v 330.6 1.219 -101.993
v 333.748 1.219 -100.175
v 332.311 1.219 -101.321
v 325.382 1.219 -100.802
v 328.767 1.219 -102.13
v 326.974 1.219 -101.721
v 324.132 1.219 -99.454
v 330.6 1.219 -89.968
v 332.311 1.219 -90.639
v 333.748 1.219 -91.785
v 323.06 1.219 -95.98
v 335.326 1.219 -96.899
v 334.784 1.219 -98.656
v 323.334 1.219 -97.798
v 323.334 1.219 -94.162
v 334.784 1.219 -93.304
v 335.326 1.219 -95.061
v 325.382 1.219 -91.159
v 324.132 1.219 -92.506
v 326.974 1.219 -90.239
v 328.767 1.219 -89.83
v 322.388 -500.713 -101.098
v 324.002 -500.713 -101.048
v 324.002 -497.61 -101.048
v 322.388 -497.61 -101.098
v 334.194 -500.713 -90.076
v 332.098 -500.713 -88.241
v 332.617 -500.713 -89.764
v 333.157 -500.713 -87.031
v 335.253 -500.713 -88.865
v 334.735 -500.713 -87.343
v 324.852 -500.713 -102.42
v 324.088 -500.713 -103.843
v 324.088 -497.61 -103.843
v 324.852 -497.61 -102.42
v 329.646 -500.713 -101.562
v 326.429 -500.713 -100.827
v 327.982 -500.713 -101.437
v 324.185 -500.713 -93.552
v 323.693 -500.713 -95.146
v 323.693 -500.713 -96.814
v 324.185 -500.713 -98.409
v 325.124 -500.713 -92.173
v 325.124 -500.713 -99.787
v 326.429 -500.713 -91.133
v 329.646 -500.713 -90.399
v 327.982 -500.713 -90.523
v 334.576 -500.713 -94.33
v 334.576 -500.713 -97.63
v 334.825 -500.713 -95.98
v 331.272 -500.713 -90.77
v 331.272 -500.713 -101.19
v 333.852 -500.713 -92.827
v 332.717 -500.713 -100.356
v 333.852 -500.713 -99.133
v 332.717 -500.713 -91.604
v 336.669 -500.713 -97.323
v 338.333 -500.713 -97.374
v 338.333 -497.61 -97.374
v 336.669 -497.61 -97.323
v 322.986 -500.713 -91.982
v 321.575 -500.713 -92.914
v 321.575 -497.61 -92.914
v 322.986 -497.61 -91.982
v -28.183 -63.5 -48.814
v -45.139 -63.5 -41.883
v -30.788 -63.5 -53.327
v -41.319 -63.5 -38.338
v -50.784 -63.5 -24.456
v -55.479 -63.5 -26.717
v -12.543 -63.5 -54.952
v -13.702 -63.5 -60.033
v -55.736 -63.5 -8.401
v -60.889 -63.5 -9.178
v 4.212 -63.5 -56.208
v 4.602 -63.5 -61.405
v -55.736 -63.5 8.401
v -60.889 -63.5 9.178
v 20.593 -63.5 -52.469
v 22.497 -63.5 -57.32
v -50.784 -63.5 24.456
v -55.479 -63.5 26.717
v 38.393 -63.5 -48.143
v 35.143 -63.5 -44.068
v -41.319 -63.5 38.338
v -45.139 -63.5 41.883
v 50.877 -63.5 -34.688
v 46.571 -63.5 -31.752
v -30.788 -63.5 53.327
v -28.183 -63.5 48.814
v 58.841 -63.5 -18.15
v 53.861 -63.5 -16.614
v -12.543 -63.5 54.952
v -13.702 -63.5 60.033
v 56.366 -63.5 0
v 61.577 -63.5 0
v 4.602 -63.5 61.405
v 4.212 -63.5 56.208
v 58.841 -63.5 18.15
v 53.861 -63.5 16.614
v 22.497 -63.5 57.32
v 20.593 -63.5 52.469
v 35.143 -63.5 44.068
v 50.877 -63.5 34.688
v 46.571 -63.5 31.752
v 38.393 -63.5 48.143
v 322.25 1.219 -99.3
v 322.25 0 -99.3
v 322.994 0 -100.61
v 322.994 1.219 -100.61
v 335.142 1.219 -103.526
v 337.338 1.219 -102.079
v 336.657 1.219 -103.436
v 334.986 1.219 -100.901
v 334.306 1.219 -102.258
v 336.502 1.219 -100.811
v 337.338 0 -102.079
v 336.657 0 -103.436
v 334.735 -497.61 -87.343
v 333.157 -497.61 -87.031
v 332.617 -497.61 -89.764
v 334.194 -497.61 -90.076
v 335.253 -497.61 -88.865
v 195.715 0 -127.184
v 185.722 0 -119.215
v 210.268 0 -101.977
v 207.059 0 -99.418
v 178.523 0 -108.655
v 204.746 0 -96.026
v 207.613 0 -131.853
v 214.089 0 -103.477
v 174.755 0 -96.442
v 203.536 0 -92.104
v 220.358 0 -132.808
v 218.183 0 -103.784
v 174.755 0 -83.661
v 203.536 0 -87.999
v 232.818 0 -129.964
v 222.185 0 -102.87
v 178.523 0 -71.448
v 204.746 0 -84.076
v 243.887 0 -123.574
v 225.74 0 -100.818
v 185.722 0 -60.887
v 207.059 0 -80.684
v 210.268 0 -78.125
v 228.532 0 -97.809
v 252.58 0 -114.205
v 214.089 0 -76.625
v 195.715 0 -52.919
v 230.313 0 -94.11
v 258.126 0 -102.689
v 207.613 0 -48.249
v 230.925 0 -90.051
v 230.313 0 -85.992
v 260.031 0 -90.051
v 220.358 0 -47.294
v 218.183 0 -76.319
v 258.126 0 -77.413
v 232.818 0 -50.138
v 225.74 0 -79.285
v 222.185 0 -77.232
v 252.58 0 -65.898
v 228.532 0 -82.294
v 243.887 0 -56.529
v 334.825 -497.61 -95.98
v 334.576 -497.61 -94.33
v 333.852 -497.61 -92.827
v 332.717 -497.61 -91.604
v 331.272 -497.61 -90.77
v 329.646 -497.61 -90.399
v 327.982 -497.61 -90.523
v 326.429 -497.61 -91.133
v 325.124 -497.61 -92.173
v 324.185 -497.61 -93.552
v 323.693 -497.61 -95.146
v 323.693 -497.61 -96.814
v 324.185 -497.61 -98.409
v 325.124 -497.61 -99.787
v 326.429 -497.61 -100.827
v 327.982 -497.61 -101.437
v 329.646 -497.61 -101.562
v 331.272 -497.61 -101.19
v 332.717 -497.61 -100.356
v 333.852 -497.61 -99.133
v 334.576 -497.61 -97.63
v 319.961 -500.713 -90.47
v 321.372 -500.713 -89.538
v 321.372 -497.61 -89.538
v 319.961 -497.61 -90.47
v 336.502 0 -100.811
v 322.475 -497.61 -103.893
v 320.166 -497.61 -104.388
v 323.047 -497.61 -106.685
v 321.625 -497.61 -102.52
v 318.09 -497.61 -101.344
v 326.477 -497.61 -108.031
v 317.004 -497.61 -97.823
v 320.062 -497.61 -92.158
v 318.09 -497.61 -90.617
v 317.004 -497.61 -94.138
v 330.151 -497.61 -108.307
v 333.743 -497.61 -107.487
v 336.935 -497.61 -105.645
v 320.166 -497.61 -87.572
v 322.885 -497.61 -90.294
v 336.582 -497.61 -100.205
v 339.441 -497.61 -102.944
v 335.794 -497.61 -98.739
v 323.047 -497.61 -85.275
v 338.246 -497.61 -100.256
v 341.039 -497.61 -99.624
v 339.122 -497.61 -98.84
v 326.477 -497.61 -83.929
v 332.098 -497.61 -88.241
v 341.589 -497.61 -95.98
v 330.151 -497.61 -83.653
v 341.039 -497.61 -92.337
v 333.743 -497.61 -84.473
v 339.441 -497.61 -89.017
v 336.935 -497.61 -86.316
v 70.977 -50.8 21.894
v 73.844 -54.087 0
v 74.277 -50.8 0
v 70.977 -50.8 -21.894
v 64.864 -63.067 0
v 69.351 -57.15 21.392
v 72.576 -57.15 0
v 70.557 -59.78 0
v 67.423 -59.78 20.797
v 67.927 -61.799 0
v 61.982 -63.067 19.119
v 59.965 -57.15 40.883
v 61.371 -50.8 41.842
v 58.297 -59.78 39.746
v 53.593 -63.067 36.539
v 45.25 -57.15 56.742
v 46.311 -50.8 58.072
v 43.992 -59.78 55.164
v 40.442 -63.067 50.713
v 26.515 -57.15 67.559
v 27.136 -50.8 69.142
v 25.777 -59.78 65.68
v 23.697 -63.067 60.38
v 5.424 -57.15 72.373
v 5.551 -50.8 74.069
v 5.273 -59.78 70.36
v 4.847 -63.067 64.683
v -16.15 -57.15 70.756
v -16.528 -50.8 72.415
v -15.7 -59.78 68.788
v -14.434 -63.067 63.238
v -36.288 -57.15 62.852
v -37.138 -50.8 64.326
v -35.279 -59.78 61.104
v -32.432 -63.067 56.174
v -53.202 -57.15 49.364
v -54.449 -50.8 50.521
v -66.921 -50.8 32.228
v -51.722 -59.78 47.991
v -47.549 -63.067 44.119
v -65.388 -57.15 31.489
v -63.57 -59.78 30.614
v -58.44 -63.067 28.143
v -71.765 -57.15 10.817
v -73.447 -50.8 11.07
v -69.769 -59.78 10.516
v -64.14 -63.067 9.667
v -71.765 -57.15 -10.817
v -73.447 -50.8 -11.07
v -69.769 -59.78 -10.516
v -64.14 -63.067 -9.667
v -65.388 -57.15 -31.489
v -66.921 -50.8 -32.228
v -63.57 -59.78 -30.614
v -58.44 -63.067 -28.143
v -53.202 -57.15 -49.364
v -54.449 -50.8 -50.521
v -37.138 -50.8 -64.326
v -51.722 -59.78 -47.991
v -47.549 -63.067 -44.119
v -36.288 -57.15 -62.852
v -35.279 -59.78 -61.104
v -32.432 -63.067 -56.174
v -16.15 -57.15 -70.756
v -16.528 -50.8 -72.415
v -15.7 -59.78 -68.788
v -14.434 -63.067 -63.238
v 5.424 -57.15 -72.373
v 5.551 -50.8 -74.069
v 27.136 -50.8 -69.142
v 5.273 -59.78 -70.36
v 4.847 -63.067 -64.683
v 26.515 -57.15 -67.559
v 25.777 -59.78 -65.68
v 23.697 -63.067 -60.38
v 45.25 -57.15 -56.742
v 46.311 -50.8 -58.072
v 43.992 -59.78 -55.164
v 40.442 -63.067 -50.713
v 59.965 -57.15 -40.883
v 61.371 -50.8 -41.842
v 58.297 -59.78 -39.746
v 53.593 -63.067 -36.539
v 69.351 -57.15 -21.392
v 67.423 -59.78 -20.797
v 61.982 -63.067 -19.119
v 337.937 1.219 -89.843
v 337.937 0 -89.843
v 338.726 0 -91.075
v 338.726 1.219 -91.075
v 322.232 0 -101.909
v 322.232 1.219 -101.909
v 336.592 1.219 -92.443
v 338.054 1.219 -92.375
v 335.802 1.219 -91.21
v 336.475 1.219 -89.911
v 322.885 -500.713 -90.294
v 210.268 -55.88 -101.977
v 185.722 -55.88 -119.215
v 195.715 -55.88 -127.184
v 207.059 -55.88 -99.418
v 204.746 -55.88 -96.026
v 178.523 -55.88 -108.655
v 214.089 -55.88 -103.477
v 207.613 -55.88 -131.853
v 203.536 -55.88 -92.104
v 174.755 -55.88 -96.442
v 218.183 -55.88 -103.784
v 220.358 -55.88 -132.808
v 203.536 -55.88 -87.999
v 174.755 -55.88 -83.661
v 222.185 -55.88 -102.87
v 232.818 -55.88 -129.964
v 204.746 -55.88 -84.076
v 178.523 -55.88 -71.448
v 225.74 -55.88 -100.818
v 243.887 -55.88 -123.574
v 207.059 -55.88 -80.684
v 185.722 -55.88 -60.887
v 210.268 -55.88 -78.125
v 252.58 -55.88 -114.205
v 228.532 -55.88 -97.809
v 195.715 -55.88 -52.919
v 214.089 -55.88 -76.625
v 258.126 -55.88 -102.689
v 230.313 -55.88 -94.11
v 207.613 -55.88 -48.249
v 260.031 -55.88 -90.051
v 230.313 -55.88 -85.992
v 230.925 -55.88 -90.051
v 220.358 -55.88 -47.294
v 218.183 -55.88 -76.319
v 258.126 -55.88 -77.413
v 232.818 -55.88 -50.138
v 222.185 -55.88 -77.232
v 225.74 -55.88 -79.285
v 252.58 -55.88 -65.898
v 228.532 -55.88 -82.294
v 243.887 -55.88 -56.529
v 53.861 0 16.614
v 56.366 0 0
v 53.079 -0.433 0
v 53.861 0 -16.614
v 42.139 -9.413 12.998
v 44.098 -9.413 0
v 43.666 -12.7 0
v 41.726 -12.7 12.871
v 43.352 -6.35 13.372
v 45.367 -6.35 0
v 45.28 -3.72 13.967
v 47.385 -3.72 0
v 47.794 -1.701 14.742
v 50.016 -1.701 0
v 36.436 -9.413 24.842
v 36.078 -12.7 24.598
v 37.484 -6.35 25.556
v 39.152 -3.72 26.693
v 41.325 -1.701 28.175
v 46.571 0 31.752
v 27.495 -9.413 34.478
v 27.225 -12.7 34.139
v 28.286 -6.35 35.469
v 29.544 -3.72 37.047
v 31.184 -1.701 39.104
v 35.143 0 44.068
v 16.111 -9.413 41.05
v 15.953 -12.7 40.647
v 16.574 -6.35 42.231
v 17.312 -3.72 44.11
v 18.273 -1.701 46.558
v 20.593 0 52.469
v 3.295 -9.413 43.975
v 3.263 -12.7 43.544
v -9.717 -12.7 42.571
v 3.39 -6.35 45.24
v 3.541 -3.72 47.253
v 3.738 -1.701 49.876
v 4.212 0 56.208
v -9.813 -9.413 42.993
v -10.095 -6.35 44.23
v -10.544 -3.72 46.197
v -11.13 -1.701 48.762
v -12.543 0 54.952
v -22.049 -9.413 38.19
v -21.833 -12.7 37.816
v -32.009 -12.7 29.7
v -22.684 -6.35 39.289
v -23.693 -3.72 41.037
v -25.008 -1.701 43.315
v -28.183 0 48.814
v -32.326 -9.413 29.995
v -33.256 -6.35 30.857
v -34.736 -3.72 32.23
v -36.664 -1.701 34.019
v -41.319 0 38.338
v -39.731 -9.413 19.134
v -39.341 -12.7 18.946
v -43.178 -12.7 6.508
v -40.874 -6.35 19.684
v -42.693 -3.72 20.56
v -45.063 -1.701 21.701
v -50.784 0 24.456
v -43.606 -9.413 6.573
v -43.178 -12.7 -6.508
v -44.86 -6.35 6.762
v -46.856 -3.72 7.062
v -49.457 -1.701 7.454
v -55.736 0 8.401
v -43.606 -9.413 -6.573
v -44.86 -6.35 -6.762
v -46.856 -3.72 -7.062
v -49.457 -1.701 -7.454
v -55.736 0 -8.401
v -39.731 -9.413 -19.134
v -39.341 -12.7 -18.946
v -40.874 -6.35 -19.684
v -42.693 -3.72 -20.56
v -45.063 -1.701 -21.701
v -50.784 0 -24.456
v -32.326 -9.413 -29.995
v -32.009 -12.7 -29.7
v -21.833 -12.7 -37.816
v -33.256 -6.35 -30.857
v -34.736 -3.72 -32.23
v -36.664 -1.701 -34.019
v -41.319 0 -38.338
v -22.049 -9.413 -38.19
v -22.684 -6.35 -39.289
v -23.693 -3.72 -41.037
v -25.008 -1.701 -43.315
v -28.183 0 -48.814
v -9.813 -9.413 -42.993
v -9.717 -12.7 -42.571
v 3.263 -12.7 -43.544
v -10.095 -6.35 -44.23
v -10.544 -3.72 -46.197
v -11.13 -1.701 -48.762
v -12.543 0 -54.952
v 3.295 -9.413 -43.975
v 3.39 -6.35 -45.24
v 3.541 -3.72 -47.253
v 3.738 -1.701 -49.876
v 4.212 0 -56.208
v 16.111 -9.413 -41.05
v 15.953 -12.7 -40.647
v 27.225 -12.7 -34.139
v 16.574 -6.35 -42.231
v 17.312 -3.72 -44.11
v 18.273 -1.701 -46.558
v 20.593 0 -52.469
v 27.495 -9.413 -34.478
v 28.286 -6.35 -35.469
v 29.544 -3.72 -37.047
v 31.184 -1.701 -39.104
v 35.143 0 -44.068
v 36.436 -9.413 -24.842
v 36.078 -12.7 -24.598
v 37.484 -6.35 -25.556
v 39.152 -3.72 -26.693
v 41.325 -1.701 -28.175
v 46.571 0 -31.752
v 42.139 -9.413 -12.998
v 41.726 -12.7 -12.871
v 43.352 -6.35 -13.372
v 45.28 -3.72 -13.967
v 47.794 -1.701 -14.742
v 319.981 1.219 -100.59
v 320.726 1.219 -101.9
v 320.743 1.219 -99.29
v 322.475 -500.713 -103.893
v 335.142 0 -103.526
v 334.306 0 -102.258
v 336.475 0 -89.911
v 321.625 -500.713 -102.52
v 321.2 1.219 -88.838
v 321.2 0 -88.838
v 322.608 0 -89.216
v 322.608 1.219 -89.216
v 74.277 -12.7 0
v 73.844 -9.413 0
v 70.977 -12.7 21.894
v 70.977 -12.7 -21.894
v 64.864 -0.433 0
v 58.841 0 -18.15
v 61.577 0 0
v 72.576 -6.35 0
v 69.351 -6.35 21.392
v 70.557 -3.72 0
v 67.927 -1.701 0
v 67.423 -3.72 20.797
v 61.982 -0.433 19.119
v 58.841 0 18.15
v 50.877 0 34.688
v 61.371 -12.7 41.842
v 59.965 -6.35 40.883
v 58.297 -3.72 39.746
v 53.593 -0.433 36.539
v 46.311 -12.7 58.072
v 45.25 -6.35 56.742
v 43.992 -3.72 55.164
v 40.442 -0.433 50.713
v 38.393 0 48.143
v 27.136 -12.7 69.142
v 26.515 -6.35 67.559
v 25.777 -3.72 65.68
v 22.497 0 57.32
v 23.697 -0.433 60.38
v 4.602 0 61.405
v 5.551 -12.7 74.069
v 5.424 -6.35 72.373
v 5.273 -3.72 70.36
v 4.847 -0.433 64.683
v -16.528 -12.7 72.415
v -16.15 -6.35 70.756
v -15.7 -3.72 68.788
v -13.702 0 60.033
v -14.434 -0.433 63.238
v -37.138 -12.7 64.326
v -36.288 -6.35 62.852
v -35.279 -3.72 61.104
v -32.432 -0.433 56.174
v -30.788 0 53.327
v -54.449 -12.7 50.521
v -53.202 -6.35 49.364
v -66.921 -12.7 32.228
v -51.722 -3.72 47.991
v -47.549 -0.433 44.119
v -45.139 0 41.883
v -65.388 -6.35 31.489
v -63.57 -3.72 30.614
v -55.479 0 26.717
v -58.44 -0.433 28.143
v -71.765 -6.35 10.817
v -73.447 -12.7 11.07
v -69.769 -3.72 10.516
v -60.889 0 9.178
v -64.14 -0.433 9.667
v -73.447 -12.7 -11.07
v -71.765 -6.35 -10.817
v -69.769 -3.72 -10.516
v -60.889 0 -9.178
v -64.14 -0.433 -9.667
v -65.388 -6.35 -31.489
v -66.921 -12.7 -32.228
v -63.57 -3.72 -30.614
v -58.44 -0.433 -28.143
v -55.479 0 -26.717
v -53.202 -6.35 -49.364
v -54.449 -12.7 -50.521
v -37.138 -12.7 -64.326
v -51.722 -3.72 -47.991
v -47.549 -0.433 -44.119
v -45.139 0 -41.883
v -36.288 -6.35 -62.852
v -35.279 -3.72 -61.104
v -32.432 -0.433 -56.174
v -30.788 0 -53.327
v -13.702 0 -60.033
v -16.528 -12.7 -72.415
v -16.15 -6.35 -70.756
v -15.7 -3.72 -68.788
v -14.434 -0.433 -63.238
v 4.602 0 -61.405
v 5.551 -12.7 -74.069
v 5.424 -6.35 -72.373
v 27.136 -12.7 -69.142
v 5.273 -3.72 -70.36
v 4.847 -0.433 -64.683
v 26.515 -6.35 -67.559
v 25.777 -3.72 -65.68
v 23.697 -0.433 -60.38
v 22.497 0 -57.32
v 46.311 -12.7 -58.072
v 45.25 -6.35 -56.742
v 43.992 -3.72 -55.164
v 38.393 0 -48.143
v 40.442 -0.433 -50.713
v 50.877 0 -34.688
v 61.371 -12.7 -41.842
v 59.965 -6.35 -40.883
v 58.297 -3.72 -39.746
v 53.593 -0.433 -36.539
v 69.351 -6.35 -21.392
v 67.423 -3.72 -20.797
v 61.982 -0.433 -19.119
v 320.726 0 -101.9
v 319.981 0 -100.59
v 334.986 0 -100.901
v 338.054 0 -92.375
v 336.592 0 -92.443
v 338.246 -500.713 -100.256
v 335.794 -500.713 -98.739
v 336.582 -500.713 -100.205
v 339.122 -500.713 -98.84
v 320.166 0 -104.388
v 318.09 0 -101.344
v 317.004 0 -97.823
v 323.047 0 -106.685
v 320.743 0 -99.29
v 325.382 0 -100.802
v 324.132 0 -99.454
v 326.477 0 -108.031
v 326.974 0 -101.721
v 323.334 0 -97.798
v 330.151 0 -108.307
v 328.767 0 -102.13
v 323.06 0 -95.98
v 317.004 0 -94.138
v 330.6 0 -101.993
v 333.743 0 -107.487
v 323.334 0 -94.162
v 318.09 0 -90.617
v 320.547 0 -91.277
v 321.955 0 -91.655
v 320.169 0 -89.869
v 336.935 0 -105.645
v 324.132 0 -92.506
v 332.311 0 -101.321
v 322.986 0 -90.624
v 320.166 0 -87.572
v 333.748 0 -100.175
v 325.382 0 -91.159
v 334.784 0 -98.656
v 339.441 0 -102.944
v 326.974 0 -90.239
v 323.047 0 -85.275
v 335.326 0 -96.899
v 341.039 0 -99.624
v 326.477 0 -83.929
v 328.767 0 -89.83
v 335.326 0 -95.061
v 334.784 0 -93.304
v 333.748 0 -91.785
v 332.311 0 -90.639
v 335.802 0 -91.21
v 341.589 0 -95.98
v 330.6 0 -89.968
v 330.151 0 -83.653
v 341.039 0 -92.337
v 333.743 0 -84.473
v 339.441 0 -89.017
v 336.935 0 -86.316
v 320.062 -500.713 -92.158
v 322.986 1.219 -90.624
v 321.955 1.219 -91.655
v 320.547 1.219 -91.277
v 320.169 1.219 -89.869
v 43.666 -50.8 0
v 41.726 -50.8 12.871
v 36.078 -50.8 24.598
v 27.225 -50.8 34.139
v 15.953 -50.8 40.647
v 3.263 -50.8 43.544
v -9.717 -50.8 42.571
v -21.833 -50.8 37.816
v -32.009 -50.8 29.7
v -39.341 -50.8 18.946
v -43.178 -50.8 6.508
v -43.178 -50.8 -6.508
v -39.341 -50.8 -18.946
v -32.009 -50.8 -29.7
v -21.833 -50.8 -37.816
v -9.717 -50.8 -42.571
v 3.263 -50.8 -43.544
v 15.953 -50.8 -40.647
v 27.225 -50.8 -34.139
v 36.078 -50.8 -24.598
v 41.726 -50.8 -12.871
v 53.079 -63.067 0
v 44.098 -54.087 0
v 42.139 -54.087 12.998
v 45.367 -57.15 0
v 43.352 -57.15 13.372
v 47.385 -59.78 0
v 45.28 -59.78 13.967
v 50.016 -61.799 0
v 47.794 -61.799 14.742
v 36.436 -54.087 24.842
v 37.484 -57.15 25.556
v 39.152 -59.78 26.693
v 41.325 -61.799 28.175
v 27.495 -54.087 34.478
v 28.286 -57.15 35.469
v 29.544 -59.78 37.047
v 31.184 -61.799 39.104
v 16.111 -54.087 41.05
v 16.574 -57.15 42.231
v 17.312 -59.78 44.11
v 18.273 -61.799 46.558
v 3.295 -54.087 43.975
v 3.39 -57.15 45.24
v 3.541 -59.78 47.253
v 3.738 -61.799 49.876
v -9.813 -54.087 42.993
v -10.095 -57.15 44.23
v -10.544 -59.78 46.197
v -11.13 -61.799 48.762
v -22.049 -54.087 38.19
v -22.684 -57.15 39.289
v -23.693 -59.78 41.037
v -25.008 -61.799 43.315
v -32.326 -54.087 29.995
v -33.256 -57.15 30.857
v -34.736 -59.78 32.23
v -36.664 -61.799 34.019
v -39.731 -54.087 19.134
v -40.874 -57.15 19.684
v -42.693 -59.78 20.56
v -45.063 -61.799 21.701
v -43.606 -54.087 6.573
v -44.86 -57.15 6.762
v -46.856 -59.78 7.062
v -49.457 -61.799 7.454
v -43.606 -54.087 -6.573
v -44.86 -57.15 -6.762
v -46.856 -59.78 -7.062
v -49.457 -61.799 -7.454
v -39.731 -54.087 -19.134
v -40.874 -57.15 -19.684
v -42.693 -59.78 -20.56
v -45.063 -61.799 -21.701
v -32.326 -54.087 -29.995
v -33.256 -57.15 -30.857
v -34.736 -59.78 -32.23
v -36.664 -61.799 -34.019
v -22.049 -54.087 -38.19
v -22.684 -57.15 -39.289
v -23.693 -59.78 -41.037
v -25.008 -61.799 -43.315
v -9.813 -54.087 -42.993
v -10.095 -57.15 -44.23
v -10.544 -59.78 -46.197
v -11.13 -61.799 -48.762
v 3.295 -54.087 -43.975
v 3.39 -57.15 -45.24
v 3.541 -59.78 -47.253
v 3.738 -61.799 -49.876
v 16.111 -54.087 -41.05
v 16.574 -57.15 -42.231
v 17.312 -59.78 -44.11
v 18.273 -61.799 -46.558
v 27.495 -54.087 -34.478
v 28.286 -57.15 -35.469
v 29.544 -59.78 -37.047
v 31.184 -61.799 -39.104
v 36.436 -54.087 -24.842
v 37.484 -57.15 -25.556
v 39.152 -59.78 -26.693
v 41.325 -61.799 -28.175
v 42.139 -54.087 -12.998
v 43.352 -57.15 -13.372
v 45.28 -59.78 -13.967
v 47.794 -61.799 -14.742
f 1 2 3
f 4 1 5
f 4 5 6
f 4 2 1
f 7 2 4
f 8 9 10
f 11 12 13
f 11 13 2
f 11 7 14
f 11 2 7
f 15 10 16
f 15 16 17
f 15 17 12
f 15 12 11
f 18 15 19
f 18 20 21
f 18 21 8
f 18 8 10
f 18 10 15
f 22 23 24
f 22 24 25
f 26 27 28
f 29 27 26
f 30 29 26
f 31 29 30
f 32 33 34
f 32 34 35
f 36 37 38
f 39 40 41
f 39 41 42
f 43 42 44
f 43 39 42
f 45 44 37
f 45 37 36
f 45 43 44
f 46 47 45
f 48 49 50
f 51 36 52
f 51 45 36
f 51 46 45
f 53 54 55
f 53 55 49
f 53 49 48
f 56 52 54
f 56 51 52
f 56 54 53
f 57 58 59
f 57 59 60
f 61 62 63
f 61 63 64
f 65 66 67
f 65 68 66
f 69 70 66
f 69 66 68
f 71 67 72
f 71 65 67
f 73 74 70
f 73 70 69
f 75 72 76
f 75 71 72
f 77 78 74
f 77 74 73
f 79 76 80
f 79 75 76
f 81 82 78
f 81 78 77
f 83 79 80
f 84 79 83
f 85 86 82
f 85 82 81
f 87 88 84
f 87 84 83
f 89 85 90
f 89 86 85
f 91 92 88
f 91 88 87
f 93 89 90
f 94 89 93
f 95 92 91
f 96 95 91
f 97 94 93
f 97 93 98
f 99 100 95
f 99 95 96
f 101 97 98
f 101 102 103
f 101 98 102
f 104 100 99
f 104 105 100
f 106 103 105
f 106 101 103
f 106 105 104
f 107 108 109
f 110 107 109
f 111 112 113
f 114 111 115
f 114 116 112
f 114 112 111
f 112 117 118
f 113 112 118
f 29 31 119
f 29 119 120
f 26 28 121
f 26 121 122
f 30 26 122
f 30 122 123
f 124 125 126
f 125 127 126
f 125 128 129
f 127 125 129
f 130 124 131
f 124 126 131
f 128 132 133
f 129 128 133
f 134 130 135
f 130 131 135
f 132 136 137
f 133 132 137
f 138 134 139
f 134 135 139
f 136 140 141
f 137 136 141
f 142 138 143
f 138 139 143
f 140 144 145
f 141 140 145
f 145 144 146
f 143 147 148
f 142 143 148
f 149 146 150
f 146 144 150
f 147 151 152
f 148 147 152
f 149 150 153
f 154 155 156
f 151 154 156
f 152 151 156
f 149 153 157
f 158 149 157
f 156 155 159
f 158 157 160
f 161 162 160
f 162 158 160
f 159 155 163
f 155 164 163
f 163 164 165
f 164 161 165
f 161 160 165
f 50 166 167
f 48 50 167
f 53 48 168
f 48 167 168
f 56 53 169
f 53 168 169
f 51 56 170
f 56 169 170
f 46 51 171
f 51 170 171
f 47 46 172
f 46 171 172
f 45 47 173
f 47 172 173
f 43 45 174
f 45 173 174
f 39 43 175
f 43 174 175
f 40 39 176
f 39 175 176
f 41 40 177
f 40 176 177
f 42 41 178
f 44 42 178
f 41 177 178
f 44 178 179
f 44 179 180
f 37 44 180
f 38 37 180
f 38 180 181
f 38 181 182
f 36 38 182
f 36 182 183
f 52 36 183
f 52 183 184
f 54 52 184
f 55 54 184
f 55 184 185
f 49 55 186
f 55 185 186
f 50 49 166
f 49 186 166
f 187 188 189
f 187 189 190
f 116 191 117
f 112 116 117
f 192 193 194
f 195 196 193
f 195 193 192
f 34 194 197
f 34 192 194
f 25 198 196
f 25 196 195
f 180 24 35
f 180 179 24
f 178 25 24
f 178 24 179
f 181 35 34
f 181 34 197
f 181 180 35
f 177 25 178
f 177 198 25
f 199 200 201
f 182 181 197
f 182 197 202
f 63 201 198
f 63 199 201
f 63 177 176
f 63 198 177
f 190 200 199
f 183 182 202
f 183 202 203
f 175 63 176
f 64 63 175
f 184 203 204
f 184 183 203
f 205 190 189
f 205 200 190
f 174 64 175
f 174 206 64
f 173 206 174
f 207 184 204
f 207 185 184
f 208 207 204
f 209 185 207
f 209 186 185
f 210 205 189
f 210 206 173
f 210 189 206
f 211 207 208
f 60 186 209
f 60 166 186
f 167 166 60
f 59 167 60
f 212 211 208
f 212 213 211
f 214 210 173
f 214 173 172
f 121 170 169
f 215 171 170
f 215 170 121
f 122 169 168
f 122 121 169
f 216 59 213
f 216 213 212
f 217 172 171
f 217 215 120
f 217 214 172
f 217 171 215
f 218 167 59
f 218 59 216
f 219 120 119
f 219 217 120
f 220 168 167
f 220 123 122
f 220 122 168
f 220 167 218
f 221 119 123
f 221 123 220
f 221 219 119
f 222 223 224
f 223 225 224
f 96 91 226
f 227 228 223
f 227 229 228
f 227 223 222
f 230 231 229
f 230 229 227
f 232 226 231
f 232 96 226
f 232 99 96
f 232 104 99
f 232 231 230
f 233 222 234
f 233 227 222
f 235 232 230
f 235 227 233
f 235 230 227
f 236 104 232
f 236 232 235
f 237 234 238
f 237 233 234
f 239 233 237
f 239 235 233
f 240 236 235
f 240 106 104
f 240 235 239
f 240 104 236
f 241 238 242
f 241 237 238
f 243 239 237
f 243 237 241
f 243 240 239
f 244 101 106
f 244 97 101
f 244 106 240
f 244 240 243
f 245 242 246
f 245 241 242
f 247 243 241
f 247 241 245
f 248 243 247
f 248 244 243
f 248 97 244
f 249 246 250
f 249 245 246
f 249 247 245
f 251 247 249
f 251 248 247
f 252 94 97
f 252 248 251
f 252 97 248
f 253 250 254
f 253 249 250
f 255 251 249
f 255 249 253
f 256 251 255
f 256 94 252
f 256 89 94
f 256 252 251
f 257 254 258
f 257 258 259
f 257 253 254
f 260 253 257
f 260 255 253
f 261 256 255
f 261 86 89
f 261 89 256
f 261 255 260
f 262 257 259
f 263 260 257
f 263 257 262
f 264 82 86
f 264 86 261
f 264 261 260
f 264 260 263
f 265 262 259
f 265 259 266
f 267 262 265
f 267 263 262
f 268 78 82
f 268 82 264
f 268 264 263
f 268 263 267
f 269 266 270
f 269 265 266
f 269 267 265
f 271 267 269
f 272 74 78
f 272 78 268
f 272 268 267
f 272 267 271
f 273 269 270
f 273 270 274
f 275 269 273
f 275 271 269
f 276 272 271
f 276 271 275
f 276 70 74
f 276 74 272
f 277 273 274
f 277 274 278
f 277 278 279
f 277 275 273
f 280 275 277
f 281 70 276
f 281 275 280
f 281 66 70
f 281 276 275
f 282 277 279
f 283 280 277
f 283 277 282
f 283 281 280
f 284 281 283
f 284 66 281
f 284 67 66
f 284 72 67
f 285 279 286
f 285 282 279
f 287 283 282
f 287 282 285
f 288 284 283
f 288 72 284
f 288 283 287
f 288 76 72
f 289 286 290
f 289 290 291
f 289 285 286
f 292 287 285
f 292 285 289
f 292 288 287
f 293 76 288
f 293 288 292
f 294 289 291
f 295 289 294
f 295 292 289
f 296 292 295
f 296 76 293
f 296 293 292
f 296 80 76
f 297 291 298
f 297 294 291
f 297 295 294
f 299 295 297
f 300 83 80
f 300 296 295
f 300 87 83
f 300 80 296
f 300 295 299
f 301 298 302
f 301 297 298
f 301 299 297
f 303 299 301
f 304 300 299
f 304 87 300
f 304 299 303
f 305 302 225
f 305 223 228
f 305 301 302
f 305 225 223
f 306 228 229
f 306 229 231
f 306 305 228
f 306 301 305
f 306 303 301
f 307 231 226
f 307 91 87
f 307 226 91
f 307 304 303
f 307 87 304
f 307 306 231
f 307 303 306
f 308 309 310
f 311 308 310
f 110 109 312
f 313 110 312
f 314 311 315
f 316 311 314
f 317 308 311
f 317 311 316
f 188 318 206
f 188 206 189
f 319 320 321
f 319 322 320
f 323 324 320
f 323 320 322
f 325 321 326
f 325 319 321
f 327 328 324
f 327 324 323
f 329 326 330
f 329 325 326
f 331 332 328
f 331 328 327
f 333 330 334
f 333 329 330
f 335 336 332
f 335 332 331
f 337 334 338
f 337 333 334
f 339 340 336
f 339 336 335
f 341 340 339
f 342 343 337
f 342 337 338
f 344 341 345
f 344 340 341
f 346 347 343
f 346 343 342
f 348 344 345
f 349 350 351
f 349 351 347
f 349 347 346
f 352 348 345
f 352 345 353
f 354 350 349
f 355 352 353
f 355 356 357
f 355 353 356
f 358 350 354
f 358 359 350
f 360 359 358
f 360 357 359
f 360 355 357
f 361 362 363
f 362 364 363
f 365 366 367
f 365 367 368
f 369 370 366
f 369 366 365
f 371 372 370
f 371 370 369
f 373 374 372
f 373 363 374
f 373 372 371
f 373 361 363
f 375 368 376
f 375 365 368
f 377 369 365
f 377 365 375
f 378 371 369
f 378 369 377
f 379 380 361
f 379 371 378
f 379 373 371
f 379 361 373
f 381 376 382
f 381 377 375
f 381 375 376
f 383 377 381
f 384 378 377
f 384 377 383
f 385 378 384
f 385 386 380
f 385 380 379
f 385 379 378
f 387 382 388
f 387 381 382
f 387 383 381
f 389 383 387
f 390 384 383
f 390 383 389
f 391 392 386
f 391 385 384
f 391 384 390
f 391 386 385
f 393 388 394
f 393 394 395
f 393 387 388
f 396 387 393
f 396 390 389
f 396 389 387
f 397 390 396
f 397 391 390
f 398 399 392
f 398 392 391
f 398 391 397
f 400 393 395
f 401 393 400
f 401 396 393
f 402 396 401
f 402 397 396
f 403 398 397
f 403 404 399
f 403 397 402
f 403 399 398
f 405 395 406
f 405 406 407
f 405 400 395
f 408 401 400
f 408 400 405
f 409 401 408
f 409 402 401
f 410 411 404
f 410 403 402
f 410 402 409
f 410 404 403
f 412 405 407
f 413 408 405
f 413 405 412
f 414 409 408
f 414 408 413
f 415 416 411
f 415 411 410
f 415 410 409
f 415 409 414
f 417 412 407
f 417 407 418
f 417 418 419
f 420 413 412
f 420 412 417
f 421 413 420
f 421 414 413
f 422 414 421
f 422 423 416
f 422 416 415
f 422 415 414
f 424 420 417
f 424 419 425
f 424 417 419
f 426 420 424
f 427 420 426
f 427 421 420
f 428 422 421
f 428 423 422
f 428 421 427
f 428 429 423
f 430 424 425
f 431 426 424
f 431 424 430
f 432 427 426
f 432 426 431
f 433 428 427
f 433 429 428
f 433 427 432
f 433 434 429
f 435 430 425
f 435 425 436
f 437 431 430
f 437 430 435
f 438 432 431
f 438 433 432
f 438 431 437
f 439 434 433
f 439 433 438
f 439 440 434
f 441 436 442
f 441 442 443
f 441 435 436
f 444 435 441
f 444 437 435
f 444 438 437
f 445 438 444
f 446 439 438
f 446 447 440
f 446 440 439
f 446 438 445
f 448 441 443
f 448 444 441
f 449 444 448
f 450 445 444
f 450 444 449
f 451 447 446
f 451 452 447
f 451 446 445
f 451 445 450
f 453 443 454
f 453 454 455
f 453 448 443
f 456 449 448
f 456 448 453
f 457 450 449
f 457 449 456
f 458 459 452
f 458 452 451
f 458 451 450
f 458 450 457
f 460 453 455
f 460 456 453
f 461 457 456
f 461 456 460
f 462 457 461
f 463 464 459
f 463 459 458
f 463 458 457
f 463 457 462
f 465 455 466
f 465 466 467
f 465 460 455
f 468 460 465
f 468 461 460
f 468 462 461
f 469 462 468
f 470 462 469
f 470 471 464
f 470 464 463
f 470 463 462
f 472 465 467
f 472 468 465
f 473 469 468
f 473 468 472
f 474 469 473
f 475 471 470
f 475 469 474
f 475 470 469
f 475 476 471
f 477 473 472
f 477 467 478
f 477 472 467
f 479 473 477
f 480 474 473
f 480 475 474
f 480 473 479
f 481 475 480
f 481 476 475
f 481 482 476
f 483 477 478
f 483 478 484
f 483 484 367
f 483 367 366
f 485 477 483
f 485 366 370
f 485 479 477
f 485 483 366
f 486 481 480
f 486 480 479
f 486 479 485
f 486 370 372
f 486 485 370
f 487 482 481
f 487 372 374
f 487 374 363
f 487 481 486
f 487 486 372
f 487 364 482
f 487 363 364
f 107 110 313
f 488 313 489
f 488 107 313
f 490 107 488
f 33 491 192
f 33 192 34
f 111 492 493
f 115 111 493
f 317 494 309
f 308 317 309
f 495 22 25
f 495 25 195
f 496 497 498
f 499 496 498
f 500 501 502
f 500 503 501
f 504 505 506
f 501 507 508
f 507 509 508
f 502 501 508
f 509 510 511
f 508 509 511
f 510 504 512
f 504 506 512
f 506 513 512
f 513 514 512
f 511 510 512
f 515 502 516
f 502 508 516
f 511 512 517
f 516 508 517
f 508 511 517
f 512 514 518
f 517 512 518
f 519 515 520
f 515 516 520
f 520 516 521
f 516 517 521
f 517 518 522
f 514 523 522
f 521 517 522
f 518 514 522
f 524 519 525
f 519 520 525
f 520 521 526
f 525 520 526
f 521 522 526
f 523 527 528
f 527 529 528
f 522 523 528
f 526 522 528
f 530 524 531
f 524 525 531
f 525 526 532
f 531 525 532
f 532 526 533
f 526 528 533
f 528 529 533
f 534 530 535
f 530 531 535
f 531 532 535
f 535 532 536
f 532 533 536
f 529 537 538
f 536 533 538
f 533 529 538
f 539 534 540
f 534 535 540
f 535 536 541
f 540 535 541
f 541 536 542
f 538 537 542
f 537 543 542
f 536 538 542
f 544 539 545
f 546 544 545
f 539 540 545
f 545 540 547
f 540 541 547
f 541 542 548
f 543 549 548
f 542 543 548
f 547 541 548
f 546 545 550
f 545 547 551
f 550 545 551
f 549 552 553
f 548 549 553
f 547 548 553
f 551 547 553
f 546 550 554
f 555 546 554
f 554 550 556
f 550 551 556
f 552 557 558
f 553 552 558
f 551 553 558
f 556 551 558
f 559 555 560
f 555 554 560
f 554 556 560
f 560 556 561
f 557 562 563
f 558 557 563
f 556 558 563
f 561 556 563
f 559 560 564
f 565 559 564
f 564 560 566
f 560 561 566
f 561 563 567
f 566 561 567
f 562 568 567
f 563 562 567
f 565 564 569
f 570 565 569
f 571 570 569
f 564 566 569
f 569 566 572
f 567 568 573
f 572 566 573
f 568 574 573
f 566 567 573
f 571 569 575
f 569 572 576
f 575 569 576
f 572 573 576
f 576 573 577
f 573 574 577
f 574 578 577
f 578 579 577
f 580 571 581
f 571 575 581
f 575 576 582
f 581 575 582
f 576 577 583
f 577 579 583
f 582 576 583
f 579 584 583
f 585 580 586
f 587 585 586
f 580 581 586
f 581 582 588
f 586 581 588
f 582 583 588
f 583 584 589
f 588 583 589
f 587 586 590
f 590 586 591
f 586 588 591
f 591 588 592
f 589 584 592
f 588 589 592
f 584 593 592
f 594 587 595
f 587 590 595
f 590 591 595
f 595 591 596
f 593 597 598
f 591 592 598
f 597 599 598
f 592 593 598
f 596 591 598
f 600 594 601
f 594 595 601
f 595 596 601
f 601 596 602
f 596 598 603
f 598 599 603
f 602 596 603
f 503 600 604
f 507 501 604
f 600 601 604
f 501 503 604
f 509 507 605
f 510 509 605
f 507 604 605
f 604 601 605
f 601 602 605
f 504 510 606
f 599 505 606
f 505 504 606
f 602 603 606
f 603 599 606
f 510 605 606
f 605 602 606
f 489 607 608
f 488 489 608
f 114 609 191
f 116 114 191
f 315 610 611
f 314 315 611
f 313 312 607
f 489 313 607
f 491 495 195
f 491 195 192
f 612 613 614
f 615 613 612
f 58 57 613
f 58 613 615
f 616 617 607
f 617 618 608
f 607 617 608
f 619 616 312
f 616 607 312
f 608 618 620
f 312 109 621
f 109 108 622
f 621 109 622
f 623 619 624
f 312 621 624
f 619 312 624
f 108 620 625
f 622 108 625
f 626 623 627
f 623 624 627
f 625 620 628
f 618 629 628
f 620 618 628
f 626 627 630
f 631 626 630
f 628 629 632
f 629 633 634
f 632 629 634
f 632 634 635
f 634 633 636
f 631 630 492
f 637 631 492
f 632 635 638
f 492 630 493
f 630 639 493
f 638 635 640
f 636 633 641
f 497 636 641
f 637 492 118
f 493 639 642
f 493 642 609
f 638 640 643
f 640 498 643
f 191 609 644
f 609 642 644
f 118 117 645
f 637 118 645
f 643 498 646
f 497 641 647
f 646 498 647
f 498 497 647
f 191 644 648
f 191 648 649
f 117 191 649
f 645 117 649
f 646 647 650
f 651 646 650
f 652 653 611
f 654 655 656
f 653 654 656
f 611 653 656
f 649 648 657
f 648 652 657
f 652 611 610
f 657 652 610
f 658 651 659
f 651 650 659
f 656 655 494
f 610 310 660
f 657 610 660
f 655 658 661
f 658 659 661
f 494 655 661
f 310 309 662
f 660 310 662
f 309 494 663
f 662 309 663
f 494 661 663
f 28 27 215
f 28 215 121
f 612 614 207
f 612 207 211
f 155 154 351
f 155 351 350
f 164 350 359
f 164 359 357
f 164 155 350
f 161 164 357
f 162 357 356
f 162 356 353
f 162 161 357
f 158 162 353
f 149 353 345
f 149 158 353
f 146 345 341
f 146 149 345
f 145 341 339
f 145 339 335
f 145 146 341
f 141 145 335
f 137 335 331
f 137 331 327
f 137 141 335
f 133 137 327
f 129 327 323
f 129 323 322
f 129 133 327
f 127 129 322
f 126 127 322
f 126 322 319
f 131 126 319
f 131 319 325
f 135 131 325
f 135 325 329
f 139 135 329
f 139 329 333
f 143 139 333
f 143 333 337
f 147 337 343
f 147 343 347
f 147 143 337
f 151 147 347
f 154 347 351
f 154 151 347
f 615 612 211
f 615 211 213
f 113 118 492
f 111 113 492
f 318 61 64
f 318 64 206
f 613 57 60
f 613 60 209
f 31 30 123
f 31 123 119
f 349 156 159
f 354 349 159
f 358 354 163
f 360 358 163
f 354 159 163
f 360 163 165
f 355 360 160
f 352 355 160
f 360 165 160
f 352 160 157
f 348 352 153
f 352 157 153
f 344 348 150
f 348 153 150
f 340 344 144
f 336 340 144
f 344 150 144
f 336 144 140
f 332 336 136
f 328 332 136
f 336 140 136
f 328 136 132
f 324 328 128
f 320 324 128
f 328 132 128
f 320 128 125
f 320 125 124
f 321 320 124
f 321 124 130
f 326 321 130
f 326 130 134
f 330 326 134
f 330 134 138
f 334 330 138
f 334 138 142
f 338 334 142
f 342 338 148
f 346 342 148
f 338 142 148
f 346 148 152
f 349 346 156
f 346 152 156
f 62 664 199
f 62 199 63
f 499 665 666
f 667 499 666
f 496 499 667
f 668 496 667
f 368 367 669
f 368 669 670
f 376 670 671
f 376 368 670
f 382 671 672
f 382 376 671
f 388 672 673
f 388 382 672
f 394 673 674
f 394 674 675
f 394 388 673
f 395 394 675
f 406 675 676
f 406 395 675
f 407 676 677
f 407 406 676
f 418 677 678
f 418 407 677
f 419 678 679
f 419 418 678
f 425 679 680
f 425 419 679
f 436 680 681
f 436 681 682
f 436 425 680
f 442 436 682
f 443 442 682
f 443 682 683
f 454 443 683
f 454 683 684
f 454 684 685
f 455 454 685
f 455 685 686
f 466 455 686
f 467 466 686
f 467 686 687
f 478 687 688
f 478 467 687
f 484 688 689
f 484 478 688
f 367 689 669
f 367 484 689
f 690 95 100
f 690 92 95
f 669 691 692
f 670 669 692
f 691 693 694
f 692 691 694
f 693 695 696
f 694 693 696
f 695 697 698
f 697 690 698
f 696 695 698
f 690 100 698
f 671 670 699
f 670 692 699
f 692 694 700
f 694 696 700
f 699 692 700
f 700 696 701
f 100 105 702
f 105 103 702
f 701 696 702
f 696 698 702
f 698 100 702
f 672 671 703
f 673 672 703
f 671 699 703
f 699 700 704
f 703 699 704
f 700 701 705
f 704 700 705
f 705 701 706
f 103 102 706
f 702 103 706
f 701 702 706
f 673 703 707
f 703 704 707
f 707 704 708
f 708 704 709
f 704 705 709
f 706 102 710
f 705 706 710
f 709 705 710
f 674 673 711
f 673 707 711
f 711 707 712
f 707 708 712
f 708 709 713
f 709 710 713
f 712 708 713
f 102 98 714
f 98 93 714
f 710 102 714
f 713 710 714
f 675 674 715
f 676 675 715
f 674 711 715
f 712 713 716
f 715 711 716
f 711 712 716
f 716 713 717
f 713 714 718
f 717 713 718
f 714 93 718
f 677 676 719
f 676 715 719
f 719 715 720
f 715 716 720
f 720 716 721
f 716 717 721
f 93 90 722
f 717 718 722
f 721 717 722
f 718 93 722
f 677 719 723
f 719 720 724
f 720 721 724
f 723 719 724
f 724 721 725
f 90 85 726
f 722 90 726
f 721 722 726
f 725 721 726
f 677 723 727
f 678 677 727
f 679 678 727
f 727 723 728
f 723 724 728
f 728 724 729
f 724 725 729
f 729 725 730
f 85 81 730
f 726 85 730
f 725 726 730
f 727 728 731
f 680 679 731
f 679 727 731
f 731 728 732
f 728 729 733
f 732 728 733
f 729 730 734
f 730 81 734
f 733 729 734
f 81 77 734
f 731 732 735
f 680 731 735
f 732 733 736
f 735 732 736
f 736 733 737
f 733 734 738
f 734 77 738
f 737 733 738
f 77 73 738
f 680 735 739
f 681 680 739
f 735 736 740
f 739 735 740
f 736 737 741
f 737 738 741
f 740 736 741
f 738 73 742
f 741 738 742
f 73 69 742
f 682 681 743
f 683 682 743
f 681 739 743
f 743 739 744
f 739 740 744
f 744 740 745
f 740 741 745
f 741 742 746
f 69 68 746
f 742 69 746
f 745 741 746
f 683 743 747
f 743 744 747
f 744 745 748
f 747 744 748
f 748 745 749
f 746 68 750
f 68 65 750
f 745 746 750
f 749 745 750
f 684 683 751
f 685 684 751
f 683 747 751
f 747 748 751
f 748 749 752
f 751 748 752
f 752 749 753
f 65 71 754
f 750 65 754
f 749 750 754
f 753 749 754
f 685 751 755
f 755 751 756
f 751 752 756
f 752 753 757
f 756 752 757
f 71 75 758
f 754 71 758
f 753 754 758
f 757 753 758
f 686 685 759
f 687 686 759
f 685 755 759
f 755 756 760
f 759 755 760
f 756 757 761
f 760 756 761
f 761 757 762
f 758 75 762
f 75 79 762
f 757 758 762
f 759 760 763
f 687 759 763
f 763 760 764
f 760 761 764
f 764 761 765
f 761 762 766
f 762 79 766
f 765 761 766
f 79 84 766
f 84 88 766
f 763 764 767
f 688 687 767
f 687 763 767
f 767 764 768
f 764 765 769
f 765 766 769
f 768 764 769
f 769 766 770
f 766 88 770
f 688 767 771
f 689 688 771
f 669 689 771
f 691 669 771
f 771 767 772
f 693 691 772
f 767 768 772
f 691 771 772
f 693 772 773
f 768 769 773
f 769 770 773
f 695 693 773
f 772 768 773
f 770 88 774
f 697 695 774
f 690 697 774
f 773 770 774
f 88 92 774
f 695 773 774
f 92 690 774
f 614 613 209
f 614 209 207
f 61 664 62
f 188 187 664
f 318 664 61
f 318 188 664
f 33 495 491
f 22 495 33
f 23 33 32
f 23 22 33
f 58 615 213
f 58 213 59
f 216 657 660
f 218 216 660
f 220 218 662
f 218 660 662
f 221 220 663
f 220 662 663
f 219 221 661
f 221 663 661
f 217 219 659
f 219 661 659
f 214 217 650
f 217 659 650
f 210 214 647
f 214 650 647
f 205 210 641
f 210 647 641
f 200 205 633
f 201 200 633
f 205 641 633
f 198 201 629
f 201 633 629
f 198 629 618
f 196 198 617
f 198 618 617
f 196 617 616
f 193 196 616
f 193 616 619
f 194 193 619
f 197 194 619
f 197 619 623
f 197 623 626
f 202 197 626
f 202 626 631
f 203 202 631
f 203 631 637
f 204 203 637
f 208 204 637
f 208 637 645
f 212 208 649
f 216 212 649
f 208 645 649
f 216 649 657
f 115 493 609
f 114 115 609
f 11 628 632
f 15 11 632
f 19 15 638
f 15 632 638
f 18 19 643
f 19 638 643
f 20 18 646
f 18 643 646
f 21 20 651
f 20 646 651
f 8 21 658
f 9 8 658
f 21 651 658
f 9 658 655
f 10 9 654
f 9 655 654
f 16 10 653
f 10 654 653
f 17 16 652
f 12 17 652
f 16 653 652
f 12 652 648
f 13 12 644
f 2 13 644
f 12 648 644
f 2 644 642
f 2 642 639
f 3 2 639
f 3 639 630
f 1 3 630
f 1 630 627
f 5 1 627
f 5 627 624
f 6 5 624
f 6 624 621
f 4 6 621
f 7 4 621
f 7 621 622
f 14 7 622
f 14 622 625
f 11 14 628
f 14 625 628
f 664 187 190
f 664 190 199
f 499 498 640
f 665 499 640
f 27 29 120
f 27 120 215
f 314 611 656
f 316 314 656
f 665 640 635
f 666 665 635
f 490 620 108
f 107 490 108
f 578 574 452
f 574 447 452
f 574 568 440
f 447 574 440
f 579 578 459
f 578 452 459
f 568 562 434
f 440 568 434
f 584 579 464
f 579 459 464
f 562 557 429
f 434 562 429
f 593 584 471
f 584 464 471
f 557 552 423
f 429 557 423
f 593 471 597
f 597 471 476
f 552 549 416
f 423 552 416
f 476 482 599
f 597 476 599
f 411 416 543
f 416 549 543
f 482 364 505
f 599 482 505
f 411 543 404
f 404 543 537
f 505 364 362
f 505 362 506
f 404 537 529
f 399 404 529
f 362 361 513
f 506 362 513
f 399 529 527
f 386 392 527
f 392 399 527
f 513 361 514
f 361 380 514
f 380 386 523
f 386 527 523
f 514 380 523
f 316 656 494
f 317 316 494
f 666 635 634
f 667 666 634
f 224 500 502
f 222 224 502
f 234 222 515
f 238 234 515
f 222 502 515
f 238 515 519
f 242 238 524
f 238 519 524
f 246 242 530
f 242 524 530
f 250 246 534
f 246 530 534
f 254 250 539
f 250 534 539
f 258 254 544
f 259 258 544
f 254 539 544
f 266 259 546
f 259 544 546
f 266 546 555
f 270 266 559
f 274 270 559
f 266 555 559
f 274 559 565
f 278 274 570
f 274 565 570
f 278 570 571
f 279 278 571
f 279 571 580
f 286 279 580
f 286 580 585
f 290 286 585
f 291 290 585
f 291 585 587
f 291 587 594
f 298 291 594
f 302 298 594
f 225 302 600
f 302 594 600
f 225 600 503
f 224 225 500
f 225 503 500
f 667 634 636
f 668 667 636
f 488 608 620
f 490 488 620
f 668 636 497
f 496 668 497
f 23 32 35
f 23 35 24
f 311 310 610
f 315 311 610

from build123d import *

# Parameters (mm, degrees)
F1_R      = 74.2769896622
F1_R_2    = 43.6656527846
F2_DEPTH  = 63.5
F3_R      = 12.7
F4_R      = 42.877056386
F4_R_2    = 13.7711488701
F5_DEPTH  = 55.88
F9_R      = 12.3612543208
F10_DEPTH = 497.6103901863
F11_R     = 5.5971792764
F12_DEPTH = 3.1027426012
F13_R     = 6.167140202
F14_DEPTH = 1.218579011


# Not quite as in the source:
# - the program builds the solid bodies; features that only make, move or delete a surface that nothing else refers to are left out


with BuildPart() as f2:
    # F1 (on face) → F2 (new body)
    with BuildSketch(Plane.XZ):
        Circle(F1_R)
        Circle(F1_R_2, mode=Mode.SUBTRACT)
    extrude(amount=F2_DEPTH)

    # F3
    f3_edges = [f2.edges().sort_by_distance(p)[0] for p in [
        (-74.27699, -63.5, 0),
        (-74.27699, 0, 0),
        (-43.665653, -63.5, 0),
        (-43.665653, 0, 0),
    ]]
    fillet(f3_edges, radius=F3_R)


with BuildPart() as f5:
    # F4 (on Front) → F5 (new body)
    with BuildSketch(Plane.XZ):
        with Locations((217.1535491943, -90.0512337685)):
            Circle(F4_R)
        with Locations((217.1535491943, -90.0512337685)):
            Circle(F4_R_2, mode=Mode.SUBTRACT)
    extrude(amount=F5_DEPTH)


with BuildPart() as f10:
    # F9 (on Front) → F10 (new body)
    with BuildSketch(Plane.XZ):
        with Locations((329.2273879051, -95.9801673889)):
            Circle(F9_R)
    extrude(amount=F10_DEPTH)

    # F11 (on face) → F12 (join)
    with BuildSketch(Plane.XZ.offset(497.6103901863)):
        Polygon((335.2533358502, -88.8653362571), (334.7347378731, -87.3432382941), (333.1572633815, -87.0313083352), (332.0983868671, -88.2414763392), (332.6169848442, -89.7635743022), (334.1944593358, -90.0755042611), align=None)
        Polygon((338.2459338014, -100.2556322923), (339.1215801239, -98.8398194313), (338.3332733805, -97.3735810408), (336.6693203146, -97.3231555113), (335.7936739922, -98.7389683723), (336.5819807356, -100.2052067628), align=None)
        Polygon((324.0882255018, -103.8427009407), (324.8517215252, -102.4203300476), (324.0016602098, -101.0479376491), (322.3881028711, -101.0979161438), (321.6246068478, -102.5202870369), (322.4746681631, -103.8926794354), align=None)
        Polygon((321.574677267, -92.9140994987), (322.9860663414, -91.9822081923), (322.8847193337, -90.2939637461), (321.3719832517, -89.5376106062), (319.9605941772, -90.4695019126), (320.0619411849, -92.1577463588), align=None)
        with Locations((329.2273879051, -95.9801673889)):
            Circle(F11_R)
    extrude(amount=F12_DEPTH)

    # F13 (on face) → F14 (join)
    with BuildSketch(Plane(origin=(0, 0, 0), x_dir=(-1, 0, 0), z_dir=(0, 1, 0))):
        with Locations((-329.2273879051, -95.9801673889)):
            Circle(F13_R)
        Polygon((-321.9546855155, -91.6545746838), (-320.5465078354, -91.2772491574), (-320.1691924867, -89.8690687502), (-321.2000548181, -88.8382138694), (-322.6082324982, -89.2155393958), (-322.9855478469, -90.623719803), align=None)
        Polygon((-338.0537469964, -92.3749109234), (-336.5919589996, -92.4425572157), (-335.8024815936, -91.2104348217), (-336.4747921844, -89.9106661354), (-337.9365801811, -89.8430198431), (-338.7260575871, -91.0751422371), align=None)
        Polygon((-335.1416822645, -103.525971147), (-334.3061506748, -102.2580638528), (-334.9864248065, -100.9005186234), (-336.5022305278, -100.8108806882), (-337.3377621174, -102.0787879825), (-336.6574879857, -103.4363332119), align=None)
        Polygon((-322.2323943953, -101.909467741), (-320.7257986069, -101.8995046616), (-319.9811289926, -100.5897728958), (-320.7430551667, -99.2900042095), (-322.2496509552, -99.299967289), (-322.9943205695, -100.6096990548), align=None)
    extrude(amount=F14_DEPTH)


solid = Compound([f2.part, f5.part, f10.part])
